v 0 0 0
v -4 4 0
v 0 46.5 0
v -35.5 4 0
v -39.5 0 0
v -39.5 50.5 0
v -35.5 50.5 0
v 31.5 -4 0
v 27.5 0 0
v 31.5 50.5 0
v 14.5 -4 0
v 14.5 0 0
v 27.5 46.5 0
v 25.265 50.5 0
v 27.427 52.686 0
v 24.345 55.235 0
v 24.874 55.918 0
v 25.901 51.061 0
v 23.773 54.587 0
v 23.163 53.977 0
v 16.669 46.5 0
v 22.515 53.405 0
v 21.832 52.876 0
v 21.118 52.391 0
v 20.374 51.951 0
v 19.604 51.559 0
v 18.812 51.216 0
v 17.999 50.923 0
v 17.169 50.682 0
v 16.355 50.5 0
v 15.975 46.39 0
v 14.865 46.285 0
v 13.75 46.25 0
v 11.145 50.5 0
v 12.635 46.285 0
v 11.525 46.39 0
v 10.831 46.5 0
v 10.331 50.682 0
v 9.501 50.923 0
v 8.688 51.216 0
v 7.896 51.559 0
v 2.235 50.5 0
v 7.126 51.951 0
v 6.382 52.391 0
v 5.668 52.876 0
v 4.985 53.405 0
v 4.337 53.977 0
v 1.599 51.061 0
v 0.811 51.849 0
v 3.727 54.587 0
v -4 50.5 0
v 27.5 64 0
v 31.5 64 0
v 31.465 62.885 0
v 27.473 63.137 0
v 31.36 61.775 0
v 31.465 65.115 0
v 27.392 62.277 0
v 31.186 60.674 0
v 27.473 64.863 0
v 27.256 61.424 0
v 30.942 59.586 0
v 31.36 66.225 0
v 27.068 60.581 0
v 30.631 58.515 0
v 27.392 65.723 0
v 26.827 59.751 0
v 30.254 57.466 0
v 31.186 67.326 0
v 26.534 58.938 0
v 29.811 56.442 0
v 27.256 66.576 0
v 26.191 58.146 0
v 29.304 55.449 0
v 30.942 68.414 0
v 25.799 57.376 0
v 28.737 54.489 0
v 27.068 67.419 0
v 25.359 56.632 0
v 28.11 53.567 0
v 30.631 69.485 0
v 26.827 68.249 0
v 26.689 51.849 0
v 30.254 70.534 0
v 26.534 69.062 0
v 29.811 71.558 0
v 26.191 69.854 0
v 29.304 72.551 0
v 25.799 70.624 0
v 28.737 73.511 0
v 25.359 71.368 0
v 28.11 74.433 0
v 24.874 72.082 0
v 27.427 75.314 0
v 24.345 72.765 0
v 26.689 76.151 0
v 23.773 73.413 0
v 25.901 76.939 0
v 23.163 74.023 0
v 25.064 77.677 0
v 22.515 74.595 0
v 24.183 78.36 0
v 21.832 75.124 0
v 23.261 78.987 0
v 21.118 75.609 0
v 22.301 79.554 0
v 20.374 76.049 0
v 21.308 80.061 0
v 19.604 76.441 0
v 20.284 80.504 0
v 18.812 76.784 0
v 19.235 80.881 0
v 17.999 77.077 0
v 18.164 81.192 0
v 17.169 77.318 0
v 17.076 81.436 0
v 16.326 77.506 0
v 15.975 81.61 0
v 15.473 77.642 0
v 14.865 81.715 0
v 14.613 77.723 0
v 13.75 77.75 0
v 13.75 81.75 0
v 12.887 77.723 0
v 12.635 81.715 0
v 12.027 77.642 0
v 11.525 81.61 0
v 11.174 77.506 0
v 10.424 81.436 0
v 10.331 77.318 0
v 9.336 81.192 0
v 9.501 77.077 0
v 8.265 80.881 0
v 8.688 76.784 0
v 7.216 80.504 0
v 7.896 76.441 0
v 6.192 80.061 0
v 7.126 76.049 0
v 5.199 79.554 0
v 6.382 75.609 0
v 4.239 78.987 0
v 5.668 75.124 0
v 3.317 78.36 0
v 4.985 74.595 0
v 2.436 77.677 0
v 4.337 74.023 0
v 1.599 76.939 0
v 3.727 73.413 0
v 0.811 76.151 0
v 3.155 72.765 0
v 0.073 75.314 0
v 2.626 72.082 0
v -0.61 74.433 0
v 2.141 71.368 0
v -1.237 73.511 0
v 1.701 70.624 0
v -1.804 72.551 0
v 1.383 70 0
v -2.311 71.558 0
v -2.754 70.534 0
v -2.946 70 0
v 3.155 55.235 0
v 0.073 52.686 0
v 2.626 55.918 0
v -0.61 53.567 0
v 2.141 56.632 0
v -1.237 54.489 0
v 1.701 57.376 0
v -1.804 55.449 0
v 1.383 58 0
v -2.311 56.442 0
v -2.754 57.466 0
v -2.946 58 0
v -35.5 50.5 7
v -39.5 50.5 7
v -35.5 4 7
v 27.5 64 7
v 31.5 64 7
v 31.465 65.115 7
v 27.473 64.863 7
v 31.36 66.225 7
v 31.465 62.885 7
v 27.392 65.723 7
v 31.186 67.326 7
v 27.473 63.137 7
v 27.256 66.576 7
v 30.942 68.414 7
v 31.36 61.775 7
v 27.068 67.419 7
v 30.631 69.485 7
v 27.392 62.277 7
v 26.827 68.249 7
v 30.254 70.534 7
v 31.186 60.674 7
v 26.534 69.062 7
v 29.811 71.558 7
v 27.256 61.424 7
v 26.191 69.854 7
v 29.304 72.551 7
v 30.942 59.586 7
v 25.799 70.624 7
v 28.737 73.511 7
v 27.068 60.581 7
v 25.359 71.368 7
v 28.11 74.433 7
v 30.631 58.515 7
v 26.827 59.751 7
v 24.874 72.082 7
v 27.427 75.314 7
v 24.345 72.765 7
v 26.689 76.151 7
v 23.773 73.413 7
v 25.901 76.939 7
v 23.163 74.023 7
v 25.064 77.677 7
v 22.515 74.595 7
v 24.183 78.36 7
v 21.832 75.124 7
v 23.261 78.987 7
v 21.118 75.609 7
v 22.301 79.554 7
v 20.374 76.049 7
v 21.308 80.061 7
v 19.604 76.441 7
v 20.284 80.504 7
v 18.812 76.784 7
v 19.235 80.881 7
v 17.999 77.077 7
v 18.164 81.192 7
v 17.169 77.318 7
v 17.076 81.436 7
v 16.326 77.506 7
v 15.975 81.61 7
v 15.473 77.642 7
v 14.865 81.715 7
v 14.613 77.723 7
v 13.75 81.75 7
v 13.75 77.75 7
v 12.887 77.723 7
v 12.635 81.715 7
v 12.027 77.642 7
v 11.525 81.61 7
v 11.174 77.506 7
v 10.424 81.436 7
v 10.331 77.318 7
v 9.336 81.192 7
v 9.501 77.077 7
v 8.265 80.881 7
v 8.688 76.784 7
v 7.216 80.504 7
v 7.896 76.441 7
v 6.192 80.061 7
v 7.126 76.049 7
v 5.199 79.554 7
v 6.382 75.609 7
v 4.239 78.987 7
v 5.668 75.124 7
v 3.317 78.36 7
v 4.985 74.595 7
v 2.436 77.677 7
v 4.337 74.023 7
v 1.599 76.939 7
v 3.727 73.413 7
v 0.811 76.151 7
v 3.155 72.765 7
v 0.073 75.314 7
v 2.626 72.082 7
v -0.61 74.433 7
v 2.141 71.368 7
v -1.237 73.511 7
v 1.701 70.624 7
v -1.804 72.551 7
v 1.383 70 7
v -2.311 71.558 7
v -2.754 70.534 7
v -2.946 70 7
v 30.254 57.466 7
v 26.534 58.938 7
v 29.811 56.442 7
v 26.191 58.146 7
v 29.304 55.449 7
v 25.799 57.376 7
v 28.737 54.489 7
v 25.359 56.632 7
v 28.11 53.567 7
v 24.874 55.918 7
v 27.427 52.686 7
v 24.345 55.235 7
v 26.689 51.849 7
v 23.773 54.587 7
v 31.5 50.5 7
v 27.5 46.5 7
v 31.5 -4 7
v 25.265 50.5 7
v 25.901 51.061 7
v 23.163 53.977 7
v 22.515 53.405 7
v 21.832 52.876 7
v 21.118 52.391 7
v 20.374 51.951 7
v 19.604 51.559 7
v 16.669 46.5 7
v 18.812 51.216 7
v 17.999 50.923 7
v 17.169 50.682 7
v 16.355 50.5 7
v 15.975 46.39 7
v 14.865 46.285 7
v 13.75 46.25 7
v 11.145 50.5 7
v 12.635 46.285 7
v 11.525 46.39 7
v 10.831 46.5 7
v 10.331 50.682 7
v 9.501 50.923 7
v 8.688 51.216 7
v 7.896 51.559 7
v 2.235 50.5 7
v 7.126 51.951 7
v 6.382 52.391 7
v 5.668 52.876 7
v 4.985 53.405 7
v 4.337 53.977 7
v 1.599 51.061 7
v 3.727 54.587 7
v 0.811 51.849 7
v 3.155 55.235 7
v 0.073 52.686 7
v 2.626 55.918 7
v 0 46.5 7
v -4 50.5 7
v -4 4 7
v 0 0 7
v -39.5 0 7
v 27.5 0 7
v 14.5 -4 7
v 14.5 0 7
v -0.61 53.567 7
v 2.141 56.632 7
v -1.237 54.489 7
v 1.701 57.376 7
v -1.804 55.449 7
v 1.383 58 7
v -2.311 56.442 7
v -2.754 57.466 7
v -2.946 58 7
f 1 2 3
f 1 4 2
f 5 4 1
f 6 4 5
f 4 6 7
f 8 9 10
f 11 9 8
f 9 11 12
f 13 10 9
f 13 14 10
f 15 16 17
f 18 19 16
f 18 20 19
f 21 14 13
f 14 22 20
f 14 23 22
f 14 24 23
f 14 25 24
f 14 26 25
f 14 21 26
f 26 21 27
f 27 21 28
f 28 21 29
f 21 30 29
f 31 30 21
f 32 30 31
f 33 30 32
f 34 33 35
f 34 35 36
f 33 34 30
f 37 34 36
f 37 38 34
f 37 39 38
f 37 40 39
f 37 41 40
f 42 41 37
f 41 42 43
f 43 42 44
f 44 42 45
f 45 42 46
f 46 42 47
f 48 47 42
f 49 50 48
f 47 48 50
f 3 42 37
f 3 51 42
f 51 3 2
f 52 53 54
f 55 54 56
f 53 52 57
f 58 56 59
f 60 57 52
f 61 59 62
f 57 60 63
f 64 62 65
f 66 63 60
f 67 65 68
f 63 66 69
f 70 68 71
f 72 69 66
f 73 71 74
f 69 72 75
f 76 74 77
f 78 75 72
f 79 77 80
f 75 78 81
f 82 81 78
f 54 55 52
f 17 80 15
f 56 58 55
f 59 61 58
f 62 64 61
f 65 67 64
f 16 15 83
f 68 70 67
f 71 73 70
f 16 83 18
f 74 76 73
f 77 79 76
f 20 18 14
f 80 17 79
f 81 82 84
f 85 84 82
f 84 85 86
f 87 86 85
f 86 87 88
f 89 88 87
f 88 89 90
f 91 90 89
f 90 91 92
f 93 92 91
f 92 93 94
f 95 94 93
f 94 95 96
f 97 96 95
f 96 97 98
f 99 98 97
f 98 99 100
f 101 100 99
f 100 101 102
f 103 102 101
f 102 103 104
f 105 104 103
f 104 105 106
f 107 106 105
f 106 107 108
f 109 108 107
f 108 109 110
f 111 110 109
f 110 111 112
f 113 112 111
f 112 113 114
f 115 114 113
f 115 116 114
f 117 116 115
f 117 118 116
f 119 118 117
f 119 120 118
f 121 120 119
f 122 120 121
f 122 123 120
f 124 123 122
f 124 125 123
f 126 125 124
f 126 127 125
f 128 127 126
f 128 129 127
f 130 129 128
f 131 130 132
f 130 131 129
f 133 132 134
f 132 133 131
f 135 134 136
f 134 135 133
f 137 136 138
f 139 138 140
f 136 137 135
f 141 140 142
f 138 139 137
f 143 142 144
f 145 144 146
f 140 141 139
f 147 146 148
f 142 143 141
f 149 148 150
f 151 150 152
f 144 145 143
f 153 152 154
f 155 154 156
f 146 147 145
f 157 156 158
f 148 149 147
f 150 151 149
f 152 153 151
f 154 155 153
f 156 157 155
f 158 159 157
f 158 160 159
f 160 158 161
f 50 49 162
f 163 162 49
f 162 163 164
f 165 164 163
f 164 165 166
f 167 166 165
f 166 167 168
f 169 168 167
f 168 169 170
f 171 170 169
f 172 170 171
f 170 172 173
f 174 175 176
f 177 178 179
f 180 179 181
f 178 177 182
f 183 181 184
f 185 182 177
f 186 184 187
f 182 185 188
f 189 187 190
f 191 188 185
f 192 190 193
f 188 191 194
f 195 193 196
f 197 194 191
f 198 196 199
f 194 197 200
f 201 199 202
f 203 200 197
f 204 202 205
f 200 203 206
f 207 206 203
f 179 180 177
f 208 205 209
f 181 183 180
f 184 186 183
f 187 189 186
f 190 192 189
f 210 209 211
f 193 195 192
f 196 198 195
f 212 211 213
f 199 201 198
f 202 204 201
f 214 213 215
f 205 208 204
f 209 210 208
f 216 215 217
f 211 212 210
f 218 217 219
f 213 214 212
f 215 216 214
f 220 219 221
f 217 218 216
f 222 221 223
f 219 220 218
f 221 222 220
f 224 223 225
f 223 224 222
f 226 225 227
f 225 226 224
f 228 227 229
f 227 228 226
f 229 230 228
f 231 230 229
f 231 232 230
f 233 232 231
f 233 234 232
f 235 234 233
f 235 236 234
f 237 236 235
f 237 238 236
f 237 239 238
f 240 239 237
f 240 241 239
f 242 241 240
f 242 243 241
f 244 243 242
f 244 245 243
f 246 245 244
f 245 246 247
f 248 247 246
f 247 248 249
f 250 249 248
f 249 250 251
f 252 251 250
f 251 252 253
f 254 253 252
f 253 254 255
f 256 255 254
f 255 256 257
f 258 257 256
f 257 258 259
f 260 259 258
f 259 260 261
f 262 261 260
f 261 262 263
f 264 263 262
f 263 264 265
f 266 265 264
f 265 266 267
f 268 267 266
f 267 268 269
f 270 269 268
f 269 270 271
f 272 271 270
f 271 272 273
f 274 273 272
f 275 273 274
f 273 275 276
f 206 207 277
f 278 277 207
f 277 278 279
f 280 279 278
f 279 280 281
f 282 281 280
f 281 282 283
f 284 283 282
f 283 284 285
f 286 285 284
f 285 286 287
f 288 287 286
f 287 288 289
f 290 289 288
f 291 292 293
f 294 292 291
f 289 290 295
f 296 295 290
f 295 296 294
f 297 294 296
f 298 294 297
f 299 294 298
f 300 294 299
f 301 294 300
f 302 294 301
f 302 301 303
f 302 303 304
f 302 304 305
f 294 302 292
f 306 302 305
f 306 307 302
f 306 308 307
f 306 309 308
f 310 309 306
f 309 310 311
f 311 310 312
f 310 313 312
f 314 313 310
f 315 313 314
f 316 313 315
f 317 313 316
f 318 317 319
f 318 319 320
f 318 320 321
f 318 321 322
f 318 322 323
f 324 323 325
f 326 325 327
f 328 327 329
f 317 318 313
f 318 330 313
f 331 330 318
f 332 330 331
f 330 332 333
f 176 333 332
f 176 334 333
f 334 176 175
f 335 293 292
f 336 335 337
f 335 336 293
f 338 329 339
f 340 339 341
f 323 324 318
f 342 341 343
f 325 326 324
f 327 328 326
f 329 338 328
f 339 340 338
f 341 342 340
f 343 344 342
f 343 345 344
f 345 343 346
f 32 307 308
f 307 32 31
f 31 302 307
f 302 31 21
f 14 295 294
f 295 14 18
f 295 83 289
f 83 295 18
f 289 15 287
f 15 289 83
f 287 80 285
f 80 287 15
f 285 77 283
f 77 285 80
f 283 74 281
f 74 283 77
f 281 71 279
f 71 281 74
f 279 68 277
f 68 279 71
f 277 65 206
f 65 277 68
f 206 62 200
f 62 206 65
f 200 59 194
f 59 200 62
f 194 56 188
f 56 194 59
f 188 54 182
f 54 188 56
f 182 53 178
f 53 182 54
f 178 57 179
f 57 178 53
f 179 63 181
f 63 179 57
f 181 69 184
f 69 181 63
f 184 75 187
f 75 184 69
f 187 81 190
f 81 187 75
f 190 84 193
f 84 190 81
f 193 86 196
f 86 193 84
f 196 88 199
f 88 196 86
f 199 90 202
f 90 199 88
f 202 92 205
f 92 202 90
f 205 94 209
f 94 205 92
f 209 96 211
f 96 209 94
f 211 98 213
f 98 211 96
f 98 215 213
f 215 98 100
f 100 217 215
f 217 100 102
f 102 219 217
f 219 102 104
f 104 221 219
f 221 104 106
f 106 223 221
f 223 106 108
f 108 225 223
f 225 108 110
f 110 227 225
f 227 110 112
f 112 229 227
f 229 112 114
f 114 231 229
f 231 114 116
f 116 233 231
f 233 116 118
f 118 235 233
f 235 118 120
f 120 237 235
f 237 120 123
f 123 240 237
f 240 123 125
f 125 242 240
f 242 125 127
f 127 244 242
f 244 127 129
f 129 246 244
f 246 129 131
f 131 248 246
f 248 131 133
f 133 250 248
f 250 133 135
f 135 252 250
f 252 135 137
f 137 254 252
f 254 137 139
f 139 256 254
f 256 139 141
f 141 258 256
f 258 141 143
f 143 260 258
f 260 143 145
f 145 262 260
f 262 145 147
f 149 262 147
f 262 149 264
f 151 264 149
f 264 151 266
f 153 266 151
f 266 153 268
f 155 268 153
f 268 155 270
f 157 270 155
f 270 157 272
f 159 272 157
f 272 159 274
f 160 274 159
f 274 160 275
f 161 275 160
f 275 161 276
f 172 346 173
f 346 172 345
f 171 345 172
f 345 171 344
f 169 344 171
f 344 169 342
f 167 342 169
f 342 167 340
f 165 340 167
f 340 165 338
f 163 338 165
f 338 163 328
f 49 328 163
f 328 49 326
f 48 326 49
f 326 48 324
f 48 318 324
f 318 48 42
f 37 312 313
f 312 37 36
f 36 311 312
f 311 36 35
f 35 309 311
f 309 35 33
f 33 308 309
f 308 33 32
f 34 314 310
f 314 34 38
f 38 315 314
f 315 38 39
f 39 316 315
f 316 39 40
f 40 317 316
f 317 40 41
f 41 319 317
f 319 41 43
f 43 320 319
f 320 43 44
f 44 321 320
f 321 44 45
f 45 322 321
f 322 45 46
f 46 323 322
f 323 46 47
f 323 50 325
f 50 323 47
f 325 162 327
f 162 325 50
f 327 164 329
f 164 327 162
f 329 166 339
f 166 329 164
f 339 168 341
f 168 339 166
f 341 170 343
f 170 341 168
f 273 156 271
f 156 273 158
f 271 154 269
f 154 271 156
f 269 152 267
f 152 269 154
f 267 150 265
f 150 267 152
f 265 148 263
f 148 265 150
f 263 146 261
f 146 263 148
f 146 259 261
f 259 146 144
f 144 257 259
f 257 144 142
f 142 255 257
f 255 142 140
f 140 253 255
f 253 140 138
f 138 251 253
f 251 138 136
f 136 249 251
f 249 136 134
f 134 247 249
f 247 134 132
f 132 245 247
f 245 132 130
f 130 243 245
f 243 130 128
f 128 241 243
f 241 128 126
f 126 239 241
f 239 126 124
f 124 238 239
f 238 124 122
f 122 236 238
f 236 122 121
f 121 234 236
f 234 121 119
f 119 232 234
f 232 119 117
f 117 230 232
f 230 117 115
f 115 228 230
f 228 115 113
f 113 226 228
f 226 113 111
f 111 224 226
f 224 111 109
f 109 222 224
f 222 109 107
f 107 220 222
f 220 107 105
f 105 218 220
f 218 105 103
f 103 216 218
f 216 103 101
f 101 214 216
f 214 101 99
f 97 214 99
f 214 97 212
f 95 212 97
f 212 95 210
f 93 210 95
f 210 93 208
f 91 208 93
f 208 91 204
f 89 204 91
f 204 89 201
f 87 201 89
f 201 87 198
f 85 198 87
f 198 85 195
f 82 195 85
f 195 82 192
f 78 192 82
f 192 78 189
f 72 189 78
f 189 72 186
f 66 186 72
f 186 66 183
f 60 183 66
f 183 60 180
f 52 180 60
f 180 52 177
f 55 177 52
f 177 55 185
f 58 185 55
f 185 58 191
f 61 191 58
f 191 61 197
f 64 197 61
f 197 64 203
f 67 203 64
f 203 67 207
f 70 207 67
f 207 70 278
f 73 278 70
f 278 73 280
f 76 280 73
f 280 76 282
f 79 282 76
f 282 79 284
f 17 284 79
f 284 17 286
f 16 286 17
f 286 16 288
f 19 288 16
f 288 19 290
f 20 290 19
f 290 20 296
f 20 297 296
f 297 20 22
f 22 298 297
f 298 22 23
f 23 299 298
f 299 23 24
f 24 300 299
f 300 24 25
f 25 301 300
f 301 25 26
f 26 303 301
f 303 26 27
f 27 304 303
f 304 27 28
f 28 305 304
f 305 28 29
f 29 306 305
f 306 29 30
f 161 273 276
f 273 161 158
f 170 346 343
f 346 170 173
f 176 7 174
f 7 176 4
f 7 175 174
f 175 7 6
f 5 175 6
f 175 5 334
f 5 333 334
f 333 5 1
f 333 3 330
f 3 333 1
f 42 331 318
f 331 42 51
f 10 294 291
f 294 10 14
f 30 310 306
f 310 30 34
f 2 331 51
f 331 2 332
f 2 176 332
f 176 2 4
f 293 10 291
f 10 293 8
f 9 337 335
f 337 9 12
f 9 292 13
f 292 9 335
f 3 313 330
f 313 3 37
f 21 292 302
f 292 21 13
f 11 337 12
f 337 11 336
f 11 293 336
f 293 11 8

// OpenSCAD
/*
2x4 bracket for under rubber
*/
$fn = 100;
minkowski_circle = 1;
wallThickness = 4;

table_thickness = 31.5 + 2* wallThickness ;
plug_width = 46.5 + wallThickness;
plug_height = 27.5 + 2* wallThickness ;
bracketWidth = 7;

translate([-table_thickness,0,0])
//polyCupIn(table_thickness, plug_width,bracketWidth,wallThickness,bracketWidth);
polyCup(table_thickness, plug_width,bracketWidth,wallThickness,bracketWidth);
translate([-wallThickness,plug_width,bracketWidth])
rotate([180,0,0])

polyCup(plug_height, plug_width, bracketWidth, wallThickness, bracketWidth);

echo(table_thickness-wallThickness*6);

translate([14.5,-wallThickness,0])
cube([wallThickness*4+1,wallThickness,bracketWidth]);

difference()
{
translate([plug_height/2 - wallThickness,64,0])
tube(plug_height/2, bracketWidth, wallThickness);

translate([-4,58,0])
cube([wallThickness*3,wallThickness*3,bracketWidth]);
}



module polyCup(od_length, od_width, od_height, wallThickness, lip)
{
    echo(od_length=od_length, od_width=od_width, od_height=od_height, wallThickness=wallThickness, lip=lip);
    
    od_points = [[0,0],[0,od_width],[od_length,od_width],[od_length,0]];
    od_paths = [[0,1,2,3]];

    in_zero = 0+wallThickness;
    in_length = od_length - wallThickness;
    in_width = od_width - wallThickness;
    

    in_points = [[in_zero,in_zero],[in_zero,od_width],[in_length,od_width ],[in_length,in_zero]];
    in_paths = [[4,5,6,7]];
    
    lip1zeroX = od_length-wallThickness;
    lip1zeroY = od_width;
    lip1zeroX2 = od_length + lip;
    lip1zeroY2 = od_width+wallThickness;

    linear_extrude(od_height,true)
    polygon(concat(od_points,in_points), concat(od_paths,in_paths));
}

module tube(od_radius, height, wallThickness)
{
    linear_extrude(height,true)
    difference()
    {
        circle(od_radius);
        circle(od_radius-wallThickness);
    }
}

module polyCupIn(in_length, in_width, in_height, wallThickness, lip)
{
    echo(in_length=in_length, in_width=in_width, in_height=in_height, wallThickness=wallThickness, lip=lip);
    
    od_points = [[0,0],[0,in_width],[in_length,in_width],[in_length,0]];
    od_paths = [[0,1,2,3]];

    in_zero = 0+wallThickness;
    od_length = in_length + wallThickness;
    od_width = in_width + wallThickness;
    
    echo(od_points=od_points);
    echo(in_points=in_points);
    in_points = [[in_zero,in_zero],[in_zero,od_width],[od_length,od_width ],[od_length,in_zero]];
    in_paths = [[4,5,6,7]];
    
    lip1zeroX = od_length-wallThickness;
    lip1zeroY = od_width;
    lip1zeroX2 = od_length + lip;
    lip1zeroY2 = od_width+wallThickness;

    linear_extrude(in_height,true)
    polygon(concat(od_points,in_points), concat(od_paths,in_paths));
}
